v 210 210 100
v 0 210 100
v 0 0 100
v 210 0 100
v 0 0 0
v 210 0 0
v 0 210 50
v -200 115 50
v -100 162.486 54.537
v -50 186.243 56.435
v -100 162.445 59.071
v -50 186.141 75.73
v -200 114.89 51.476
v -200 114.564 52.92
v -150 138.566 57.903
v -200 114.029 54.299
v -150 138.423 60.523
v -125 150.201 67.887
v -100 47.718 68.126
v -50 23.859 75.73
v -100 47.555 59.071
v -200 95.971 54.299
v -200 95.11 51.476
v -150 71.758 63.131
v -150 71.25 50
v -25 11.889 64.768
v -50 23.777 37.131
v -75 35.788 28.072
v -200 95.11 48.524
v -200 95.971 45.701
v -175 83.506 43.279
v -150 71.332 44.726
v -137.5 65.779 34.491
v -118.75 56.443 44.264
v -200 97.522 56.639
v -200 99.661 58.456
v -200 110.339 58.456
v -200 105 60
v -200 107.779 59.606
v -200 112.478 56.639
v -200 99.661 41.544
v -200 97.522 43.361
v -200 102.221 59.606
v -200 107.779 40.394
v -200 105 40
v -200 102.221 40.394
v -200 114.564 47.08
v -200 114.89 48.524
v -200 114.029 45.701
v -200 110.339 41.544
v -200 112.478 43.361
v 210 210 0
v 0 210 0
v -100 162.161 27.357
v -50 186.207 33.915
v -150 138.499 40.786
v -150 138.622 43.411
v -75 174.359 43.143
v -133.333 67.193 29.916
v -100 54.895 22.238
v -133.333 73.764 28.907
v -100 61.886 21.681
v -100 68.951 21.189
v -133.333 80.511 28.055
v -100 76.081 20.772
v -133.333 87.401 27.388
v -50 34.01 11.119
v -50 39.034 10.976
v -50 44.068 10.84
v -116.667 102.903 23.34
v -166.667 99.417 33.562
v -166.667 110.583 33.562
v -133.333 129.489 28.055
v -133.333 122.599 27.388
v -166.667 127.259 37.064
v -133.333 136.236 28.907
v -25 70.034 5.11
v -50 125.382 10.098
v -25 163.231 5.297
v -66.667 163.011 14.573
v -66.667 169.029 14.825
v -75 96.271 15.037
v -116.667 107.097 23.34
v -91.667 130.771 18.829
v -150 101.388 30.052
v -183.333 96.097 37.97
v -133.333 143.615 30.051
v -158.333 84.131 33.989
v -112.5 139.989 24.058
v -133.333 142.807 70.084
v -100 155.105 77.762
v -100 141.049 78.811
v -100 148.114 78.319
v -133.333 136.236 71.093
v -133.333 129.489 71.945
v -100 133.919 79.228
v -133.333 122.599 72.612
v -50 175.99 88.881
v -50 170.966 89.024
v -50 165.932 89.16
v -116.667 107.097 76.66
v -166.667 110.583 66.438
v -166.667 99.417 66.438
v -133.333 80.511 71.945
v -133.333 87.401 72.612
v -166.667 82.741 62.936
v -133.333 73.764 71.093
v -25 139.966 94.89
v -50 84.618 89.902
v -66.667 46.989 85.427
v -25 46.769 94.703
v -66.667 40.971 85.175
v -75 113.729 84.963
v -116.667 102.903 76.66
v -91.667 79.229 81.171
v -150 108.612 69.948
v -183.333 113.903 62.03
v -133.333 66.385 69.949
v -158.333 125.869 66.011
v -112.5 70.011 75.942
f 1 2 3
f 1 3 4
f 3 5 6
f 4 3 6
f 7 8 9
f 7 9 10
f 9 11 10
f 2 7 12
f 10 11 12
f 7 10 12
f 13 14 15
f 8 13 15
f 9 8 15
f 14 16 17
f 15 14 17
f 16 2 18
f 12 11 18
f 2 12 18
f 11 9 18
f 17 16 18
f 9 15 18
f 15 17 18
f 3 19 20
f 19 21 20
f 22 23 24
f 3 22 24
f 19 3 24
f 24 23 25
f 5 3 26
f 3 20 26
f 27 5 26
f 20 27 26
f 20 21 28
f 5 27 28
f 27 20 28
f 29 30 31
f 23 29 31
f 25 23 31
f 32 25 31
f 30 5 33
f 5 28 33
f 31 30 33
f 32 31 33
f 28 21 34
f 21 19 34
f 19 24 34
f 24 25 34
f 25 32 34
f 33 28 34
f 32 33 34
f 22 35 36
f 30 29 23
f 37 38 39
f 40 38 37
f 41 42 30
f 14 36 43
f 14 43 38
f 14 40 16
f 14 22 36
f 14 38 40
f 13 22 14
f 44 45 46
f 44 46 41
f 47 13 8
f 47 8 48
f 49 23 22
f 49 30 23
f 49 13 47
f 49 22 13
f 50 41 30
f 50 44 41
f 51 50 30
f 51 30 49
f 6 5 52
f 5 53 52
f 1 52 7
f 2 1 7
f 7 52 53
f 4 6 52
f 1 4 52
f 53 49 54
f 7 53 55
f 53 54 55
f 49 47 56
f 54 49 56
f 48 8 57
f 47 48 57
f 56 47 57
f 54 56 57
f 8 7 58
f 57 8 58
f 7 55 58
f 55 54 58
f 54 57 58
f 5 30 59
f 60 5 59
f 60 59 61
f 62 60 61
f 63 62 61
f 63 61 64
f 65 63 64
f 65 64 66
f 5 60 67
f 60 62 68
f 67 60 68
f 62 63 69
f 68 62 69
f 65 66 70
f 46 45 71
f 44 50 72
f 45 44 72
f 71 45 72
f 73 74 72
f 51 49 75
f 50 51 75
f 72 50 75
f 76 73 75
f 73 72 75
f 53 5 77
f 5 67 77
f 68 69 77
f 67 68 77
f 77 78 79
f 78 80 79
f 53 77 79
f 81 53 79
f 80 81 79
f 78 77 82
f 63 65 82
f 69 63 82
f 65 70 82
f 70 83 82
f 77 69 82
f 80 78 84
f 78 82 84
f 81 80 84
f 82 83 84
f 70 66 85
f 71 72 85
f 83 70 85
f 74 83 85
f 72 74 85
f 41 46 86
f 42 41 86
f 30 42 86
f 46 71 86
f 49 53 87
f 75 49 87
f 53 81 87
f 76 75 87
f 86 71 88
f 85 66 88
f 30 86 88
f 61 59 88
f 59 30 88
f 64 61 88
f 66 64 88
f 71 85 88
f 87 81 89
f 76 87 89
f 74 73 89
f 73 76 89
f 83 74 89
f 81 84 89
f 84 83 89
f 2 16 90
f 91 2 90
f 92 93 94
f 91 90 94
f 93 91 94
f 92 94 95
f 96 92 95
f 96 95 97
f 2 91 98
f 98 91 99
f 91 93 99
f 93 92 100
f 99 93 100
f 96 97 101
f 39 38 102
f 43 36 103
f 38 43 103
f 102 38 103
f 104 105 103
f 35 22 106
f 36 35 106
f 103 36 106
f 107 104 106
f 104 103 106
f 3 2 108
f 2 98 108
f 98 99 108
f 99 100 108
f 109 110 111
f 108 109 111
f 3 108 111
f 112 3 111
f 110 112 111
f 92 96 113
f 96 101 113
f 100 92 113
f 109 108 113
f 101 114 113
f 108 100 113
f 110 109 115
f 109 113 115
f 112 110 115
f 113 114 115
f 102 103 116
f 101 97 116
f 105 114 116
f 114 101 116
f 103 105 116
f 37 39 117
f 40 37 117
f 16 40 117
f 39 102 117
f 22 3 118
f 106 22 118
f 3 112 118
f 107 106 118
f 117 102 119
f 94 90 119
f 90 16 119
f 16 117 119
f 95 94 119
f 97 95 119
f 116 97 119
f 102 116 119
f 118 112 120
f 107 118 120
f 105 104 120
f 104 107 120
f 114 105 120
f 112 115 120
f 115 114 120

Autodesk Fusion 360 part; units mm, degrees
sketch "Sketch1" plane through (0, 0, 0) normal (0, 0, 1) x (1, 0, 0)
  line L0 (0, 0) -> (210, 0)
  line L1 (210, 0) -> (210, 210)
  line L2 (210, 210) -> (0, 210)
  line L3 (0, 210) -> (0, 0)
  dimension "d1" = 210
  dimension "d2" = 210
extrude "Extrude1" add sketch "Sketch1" along normal blind 100
ref_plane "WorkPlane1" through (-200, 105, 50) normal (-1, 0, 0) x (0, -1, 0)
sketch "Sketch2" plane through (-200, 105, 50) normal (-1, 0, 0) x (0, 1, 0)
  circle A0 centre (0, 0) radius 10
  dimension "d6" = 20
loft "Loft1" add profiles "Sketch2" section 1 face at (0, 140, 33.3333) section 2
